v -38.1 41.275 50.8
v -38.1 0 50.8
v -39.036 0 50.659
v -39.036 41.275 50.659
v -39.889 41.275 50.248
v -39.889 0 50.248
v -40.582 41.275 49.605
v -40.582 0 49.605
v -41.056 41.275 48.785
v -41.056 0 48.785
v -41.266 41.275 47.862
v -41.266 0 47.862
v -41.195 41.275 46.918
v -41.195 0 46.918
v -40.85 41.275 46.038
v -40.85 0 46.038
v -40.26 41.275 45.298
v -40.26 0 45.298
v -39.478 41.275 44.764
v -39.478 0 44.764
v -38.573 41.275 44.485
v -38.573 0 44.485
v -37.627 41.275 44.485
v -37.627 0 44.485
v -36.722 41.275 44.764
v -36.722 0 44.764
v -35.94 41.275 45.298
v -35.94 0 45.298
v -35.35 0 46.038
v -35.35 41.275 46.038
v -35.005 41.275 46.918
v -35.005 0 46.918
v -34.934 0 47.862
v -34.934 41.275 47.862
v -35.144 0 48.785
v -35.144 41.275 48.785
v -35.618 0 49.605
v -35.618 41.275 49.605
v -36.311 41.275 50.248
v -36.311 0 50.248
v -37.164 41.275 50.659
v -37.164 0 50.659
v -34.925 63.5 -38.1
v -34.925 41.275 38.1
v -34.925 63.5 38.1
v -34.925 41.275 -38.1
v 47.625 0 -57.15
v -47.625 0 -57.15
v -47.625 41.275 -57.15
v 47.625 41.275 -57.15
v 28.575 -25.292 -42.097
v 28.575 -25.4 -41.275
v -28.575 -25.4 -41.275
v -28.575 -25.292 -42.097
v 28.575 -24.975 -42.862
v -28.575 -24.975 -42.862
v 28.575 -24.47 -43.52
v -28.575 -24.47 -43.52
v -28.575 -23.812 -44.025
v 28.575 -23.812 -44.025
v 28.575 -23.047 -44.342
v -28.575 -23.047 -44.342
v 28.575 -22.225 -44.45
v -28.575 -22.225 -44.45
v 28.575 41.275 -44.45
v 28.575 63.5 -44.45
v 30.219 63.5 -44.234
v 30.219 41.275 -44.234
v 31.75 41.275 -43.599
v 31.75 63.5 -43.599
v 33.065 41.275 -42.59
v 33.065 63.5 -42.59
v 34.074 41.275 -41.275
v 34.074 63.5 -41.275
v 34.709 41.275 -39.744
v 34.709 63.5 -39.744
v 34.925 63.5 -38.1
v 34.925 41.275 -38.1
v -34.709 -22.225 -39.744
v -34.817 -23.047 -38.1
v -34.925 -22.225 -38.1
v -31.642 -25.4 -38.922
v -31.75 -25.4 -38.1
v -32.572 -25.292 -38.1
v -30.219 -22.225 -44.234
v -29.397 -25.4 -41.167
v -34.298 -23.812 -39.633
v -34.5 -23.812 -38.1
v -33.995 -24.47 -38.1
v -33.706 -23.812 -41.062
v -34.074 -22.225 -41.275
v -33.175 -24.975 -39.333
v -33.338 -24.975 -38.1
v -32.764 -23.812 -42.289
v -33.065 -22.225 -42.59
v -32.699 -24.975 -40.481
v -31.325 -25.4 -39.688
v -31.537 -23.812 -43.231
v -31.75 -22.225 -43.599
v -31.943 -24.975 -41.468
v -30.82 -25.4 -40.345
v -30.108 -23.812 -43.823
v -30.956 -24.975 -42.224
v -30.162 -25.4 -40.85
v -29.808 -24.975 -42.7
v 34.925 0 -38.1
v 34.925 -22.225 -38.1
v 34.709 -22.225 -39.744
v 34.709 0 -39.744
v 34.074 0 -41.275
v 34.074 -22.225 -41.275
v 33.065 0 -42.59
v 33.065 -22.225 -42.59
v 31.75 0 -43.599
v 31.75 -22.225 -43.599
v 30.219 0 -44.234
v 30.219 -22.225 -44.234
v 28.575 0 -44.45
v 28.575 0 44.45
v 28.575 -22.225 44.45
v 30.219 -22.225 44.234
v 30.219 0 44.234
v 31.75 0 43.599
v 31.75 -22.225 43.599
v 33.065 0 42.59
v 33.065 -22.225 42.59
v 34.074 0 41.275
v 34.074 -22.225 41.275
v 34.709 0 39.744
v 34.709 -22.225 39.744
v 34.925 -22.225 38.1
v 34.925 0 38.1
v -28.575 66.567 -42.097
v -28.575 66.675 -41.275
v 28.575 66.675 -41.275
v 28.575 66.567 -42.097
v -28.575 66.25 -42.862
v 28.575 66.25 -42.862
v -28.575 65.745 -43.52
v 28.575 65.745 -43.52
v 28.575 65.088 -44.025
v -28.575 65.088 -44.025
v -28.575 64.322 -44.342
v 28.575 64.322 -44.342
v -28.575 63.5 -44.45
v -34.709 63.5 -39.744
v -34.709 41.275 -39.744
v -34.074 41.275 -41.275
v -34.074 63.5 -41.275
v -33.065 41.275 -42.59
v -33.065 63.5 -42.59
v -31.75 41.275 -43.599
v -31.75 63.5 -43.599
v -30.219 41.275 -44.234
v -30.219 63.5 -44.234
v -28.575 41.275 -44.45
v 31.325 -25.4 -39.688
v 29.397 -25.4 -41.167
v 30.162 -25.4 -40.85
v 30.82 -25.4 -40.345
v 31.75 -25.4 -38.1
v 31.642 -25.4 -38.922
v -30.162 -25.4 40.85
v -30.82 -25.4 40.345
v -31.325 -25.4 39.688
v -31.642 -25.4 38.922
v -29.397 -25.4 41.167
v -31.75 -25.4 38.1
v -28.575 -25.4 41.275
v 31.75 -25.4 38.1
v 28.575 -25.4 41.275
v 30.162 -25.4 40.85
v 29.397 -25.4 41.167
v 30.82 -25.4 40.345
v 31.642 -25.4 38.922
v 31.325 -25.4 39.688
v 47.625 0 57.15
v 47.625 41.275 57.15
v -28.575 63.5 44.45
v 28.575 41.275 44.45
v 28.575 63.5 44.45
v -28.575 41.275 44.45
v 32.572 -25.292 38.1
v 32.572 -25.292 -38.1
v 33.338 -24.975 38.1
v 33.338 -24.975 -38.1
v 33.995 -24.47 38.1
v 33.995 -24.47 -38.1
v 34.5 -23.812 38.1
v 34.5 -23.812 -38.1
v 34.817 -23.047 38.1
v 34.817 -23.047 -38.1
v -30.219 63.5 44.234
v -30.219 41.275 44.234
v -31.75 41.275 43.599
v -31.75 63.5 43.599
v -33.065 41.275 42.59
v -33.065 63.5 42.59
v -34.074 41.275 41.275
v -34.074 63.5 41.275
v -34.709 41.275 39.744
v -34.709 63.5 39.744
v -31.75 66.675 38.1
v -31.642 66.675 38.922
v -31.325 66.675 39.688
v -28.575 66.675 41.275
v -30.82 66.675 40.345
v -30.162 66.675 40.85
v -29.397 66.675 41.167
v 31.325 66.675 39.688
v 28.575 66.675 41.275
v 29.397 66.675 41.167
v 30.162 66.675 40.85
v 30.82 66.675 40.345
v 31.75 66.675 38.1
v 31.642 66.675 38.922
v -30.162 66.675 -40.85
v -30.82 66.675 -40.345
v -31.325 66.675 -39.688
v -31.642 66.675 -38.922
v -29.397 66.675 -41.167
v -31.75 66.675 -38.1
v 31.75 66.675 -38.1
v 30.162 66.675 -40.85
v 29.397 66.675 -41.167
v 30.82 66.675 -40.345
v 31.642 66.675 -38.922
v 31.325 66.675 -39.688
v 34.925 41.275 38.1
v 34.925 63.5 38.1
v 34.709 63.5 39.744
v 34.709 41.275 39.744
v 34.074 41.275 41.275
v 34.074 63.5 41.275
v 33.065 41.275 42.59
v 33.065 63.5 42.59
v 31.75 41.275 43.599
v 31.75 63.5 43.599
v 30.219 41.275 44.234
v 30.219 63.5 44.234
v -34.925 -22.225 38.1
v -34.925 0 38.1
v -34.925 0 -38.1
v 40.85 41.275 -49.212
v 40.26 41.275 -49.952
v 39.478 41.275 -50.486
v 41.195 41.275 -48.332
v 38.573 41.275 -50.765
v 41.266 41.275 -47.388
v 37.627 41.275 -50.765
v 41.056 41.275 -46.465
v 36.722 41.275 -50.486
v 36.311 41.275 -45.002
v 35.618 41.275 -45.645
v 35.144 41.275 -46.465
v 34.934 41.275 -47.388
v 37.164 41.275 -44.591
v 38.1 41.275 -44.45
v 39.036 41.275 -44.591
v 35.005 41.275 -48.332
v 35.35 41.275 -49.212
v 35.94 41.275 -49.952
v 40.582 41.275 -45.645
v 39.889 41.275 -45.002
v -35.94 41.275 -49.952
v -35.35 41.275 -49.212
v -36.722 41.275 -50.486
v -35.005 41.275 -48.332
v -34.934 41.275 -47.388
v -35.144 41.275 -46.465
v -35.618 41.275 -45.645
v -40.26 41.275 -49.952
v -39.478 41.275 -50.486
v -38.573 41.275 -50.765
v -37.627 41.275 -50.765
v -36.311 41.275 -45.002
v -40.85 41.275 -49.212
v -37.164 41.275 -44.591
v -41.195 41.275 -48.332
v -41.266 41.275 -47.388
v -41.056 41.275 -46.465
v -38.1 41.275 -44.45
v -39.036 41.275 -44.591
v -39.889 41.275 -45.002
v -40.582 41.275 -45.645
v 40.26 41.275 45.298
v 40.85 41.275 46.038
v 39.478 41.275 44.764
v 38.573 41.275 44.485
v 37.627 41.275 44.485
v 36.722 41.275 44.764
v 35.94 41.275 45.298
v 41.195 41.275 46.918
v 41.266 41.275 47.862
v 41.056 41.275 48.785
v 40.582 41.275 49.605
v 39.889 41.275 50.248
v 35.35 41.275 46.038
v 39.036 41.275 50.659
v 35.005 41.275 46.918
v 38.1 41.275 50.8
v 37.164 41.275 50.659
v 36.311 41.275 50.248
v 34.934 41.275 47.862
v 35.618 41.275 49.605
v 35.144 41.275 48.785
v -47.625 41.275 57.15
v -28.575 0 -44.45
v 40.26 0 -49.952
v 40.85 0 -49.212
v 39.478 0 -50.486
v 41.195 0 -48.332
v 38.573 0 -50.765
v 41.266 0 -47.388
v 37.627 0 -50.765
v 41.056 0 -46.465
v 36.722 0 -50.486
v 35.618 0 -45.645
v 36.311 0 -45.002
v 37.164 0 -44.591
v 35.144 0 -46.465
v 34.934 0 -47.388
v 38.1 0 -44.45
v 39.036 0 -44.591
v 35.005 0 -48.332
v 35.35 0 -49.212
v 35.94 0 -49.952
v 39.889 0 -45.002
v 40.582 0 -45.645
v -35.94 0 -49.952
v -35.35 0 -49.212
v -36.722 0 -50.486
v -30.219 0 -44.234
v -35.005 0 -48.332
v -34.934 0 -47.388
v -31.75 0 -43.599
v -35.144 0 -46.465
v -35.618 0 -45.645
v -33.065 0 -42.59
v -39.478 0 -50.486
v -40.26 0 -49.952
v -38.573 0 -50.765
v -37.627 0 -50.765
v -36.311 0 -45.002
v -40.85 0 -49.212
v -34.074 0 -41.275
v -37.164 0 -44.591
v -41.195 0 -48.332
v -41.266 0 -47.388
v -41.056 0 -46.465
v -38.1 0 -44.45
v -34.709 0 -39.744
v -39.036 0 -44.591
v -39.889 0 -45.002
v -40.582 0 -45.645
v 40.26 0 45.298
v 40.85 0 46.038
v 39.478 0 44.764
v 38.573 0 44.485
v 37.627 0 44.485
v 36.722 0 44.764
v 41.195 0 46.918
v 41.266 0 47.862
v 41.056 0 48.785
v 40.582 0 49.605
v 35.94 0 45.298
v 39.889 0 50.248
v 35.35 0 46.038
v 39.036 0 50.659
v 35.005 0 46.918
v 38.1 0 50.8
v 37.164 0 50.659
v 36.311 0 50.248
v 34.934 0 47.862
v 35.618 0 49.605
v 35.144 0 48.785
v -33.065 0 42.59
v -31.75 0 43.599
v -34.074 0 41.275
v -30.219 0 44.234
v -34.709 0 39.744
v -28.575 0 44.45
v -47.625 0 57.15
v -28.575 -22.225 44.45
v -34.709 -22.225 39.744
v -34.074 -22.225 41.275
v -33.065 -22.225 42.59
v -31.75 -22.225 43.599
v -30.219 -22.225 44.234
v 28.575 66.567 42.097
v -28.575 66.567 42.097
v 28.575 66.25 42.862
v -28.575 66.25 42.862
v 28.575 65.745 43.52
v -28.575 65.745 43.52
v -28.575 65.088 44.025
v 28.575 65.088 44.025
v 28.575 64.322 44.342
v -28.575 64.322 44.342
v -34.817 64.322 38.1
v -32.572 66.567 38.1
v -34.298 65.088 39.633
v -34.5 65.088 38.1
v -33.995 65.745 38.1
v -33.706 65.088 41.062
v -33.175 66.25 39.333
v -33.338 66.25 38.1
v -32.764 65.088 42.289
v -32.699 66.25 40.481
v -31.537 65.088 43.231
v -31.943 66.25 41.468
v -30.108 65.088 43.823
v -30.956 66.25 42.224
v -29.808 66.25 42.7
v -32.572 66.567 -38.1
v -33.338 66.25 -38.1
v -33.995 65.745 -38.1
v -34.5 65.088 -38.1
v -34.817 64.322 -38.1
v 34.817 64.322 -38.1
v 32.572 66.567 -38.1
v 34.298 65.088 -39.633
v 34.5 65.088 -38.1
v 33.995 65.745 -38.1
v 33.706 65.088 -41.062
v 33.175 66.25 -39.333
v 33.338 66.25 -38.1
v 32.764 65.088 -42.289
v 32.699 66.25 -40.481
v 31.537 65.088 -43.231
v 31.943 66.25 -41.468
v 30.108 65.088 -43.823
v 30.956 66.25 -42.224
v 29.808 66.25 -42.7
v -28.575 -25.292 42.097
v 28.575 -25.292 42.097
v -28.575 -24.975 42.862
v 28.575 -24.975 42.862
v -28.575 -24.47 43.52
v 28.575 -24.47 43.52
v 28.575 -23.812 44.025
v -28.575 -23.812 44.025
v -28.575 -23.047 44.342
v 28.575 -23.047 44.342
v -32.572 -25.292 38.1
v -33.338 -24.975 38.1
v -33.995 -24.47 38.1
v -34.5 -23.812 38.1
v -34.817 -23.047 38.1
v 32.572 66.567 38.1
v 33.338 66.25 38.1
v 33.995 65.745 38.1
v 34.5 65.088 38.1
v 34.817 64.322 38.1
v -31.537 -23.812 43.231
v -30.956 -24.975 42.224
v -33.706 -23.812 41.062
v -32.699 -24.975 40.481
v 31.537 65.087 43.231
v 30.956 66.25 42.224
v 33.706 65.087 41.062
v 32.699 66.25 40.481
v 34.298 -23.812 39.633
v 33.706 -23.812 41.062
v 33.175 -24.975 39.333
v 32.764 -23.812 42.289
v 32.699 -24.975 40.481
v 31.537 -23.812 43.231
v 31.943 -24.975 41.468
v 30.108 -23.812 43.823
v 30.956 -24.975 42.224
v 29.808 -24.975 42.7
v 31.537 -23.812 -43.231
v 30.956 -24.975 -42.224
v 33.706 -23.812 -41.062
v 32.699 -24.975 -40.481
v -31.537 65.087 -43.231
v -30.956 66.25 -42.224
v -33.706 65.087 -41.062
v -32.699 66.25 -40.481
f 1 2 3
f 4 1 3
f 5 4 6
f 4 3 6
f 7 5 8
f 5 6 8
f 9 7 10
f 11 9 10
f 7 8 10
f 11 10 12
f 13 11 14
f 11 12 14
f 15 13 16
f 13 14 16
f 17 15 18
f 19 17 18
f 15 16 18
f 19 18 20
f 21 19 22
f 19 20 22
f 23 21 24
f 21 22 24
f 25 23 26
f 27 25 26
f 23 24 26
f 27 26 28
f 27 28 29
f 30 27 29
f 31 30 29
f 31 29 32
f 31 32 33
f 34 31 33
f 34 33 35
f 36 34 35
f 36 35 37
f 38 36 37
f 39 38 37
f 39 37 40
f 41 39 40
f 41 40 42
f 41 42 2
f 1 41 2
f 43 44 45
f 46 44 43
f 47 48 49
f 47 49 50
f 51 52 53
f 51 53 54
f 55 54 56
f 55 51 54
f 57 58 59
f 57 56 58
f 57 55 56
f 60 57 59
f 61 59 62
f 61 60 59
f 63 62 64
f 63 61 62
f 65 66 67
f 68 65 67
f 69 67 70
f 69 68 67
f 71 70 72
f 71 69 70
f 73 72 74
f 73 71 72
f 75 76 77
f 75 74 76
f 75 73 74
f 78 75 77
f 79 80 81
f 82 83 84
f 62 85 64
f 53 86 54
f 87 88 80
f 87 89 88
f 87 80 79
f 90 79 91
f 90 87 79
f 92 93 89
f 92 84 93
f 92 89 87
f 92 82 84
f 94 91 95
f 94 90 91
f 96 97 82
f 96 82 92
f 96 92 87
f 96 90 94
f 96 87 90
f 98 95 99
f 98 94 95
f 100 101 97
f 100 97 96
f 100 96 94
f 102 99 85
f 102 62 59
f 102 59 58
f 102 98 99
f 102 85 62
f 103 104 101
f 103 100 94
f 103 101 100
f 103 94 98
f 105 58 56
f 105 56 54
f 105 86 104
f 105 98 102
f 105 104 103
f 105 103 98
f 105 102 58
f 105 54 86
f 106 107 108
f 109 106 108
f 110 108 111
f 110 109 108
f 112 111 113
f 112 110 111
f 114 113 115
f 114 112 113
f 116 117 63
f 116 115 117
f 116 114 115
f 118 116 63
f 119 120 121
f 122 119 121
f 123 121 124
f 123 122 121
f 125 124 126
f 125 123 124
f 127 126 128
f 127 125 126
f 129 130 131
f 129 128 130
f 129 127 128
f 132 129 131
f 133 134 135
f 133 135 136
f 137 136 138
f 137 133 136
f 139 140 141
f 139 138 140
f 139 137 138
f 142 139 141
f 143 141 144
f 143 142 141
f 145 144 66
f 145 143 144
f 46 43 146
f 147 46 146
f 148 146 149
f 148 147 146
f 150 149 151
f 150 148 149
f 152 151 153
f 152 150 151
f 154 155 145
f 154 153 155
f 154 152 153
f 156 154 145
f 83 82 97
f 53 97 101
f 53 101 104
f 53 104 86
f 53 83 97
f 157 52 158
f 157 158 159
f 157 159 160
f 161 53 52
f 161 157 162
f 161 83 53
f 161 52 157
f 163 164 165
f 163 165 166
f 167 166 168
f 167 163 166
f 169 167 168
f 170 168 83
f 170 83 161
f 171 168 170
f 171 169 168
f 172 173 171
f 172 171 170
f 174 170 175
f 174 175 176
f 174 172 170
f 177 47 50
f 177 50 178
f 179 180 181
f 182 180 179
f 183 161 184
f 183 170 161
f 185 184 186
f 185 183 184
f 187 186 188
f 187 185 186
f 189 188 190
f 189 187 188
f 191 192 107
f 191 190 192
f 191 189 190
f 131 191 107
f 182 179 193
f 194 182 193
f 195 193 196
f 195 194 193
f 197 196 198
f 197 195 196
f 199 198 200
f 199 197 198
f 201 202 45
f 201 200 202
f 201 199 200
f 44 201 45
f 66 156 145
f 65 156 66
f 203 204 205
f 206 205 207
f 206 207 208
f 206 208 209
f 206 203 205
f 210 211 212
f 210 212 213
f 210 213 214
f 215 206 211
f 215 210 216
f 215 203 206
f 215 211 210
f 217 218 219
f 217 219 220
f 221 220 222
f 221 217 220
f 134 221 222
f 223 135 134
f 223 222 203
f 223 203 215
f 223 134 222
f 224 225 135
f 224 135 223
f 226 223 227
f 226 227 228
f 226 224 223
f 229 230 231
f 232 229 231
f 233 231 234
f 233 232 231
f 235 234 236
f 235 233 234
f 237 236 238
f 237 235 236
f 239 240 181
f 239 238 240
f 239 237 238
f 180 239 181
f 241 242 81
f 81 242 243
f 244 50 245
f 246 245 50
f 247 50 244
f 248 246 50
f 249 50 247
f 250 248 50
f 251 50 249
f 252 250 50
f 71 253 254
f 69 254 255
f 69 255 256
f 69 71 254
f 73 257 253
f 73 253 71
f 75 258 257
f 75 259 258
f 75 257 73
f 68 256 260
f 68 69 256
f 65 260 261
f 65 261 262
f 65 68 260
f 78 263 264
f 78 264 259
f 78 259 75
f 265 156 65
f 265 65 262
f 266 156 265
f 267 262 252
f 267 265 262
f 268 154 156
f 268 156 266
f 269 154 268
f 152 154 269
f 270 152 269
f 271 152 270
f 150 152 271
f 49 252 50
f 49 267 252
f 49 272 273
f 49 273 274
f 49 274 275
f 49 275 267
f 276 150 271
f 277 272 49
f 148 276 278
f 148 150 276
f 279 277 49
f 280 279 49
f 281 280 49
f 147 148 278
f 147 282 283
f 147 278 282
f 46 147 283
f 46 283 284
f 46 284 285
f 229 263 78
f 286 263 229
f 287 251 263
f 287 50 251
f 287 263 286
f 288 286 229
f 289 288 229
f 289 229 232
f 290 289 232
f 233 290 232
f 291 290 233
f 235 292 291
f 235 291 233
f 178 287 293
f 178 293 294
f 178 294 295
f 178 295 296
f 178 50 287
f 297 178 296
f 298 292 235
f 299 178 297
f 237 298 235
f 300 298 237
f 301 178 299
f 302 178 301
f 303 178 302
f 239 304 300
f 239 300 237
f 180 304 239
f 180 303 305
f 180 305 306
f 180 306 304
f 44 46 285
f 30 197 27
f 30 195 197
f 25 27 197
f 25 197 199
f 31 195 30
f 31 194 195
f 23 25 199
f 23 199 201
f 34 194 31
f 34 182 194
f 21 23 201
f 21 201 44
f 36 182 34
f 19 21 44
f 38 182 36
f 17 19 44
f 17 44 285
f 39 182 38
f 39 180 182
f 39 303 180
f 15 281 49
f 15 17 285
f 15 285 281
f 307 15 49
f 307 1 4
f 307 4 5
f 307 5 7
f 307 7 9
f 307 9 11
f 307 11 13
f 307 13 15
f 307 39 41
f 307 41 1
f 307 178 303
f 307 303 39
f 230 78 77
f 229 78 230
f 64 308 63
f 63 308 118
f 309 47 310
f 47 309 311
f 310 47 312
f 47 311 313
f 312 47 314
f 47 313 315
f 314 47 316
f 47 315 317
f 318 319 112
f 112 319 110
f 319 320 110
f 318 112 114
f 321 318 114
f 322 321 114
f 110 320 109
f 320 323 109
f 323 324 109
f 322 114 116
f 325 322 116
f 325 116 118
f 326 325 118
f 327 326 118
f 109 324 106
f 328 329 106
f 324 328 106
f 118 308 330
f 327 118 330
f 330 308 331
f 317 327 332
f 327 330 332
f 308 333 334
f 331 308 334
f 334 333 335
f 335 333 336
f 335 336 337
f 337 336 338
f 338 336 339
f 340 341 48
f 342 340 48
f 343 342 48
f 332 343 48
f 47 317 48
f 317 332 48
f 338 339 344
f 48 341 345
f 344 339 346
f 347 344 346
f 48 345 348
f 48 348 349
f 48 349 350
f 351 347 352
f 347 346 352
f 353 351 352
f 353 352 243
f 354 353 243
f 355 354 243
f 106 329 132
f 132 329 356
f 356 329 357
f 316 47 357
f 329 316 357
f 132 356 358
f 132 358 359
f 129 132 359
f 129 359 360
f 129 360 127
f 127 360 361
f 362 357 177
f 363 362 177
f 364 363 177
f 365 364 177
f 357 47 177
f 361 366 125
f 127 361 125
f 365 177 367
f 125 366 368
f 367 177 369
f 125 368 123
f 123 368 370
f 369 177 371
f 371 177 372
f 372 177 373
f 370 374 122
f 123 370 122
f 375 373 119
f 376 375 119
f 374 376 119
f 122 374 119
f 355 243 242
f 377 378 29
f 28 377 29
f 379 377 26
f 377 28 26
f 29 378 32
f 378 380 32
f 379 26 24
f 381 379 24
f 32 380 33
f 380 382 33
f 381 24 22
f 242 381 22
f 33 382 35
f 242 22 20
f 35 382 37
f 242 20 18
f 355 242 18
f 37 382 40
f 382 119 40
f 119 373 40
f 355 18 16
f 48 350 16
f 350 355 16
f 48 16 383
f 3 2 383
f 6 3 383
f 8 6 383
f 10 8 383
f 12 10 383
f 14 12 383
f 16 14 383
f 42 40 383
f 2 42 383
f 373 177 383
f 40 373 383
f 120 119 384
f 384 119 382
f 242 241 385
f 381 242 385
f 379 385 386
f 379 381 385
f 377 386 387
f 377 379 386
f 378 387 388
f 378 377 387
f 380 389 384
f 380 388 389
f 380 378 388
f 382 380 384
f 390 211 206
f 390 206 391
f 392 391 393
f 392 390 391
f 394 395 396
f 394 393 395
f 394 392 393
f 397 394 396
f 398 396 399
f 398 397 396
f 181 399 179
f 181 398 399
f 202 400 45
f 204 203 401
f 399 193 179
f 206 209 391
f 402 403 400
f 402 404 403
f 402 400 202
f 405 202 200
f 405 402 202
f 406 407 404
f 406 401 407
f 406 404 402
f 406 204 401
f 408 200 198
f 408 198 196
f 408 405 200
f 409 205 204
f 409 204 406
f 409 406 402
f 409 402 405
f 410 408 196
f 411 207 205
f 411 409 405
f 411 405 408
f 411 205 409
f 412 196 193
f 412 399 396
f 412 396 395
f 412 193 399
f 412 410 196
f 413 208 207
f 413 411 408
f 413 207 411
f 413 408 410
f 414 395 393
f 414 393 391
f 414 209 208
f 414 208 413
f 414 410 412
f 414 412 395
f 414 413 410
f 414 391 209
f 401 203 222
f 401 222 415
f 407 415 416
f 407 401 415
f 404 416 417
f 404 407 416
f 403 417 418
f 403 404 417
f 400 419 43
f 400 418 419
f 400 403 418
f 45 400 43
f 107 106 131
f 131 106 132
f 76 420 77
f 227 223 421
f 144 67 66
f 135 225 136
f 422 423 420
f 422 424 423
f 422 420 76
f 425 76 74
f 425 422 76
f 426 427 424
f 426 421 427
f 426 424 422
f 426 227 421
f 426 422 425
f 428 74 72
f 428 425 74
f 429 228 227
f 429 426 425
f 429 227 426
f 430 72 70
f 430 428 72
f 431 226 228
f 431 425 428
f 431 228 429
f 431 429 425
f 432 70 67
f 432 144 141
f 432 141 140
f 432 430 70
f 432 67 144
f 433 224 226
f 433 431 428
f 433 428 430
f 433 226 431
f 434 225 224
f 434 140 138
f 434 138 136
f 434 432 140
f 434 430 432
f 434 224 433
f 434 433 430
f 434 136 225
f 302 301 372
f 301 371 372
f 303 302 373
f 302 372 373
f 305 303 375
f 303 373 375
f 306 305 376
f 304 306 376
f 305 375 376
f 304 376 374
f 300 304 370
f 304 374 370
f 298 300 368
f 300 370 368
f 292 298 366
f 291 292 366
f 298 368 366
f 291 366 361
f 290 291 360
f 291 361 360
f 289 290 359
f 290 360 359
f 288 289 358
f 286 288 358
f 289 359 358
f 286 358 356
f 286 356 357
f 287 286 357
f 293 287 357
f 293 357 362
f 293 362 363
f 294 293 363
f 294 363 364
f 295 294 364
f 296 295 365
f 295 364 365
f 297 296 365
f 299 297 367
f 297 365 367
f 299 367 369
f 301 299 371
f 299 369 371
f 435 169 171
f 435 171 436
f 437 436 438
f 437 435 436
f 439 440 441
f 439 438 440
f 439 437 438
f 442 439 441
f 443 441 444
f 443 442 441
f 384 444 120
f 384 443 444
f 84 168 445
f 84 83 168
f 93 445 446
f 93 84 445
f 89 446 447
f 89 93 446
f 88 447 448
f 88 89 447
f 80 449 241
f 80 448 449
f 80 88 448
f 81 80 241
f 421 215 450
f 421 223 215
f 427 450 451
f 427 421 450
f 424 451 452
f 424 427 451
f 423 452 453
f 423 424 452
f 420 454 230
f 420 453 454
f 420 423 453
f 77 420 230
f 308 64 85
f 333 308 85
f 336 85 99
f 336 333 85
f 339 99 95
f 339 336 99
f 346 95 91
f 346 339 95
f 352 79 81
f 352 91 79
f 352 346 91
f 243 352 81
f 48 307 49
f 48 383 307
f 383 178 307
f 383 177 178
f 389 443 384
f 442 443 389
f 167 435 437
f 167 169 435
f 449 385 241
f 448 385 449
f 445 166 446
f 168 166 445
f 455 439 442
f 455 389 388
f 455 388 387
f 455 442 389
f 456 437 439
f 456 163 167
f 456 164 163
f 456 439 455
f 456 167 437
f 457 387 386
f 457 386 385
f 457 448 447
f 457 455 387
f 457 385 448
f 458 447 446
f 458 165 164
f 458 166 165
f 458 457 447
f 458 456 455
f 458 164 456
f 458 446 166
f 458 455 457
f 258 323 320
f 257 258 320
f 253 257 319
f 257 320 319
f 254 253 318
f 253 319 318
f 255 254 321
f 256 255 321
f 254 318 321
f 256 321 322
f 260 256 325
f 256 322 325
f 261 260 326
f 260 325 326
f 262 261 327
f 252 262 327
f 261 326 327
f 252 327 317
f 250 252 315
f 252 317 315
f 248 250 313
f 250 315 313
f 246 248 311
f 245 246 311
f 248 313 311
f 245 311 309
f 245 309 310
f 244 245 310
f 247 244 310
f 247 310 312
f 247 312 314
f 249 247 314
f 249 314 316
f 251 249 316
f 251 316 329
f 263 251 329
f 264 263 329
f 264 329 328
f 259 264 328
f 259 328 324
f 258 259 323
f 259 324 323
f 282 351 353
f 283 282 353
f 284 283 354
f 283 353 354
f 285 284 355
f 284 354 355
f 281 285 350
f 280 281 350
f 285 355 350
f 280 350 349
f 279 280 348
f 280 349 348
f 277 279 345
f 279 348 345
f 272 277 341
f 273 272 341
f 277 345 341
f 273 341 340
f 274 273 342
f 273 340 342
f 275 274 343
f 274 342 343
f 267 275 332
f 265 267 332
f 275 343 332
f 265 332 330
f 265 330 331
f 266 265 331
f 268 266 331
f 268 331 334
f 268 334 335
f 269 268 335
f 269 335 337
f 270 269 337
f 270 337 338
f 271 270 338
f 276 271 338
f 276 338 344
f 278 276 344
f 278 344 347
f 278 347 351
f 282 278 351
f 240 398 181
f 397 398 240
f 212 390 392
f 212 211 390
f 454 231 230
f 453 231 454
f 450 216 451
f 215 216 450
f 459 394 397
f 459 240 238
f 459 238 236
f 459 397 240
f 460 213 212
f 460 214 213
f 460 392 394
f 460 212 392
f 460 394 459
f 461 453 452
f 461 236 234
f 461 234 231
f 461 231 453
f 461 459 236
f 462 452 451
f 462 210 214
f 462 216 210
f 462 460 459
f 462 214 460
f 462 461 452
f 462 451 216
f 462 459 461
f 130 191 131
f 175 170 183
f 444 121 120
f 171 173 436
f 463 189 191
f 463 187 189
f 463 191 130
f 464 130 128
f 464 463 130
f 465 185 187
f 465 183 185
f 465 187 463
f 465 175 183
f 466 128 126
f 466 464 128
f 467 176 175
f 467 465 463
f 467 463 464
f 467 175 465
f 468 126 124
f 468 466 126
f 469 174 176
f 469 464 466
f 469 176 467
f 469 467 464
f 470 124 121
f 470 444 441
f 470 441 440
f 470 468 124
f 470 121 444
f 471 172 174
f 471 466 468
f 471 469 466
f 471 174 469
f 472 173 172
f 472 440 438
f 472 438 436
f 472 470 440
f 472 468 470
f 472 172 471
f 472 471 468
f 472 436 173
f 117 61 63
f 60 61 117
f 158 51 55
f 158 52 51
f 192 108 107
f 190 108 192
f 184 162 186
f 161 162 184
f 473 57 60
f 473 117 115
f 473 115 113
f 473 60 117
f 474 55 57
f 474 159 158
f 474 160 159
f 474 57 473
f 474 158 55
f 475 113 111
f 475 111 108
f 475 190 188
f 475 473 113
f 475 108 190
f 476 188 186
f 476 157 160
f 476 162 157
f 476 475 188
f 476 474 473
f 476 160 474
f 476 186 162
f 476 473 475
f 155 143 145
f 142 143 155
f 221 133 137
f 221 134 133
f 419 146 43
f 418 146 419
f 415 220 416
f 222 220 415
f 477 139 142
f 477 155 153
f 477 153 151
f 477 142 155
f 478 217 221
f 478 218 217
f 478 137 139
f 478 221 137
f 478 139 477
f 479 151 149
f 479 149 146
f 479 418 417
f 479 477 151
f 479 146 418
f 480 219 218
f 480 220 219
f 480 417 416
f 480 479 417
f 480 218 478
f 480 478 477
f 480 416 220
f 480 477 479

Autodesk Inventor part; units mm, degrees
ref_plane "YZ Plane" through (0, 0, 0) normal (1, 0, 0) x (0, 1, 0)
ref_plane "XZ Plane" through (0, 0, 0) normal (0, 1, 0) x (-1, 0, 0)
ref_plane "XY Plane" through (0, 0, 0) normal (0, 0, 1) x (1, 0, 0)
sketch "Sketch1" plane through (0, 0, 0) normal (0, 1, 0) x (-1, 0, 0)
  line L0 (-47.625, 57.15) -> (47.625, 57.15)
  line L1 (47.625, 57.15) -> (47.625, -57.15)
  line L2 (47.625, -57.15) -> (-47.625, -57.15)
  line L3 (-47.625, -57.15) -> (-47.625, 57.15)
  line L4 (-47.625, 57.15) -> (47.625, -57.15) construction
  line L5 (47.625, 57.15) -> (-47.625, -57.15) construction
  point P0 (0, 0)
  dimension "d0" = 114.3
  dimension "d1" = 95.25
extrude "Extrusion1" add sketch "Sketch1" along normal blind 41.275
sketch "Sketch2" plane through (0, 41.275, 0) normal (0, 1, 0) x (1, 0, 0)
  line L0 (28.575, -44.45) -> (-28.575, -44.45)
  line L1 (-34.925, -38.1) -> (-34.925, 38.1)
  line L2 (-28.575, 44.45) -> (28.575, 44.45)
  line L3 (34.925, 38.1) -> (34.925, -38.1)
  line L4 (34.925, -44.45) -> (-34.925, 44.45) construction
  line L5 (-34.925, -44.45) -> (34.925, 44.45) construction
  arc A0 (-34.925, -38.1) -> (-28.575, -44.45) centre (-28.575, -38.1) ccw
  arc A1 (-28.575, 44.45) -> (-34.925, 38.1) centre (-28.575, 38.1) ccw
  arc A2 (34.925, 38.1) -> (28.575, 44.45) centre (28.575, 38.1) ccw
  arc A3 (28.575, -44.45) -> (34.925, -38.1) centre (28.575, -38.1) ccw
  line L6 (-47.625, 57.15) -> (-47.625, -57.15) projected
  line L7 (47.625, 57.15) -> (-47.625, 57.15) projected
  point P0 (0, 0)
  dimension "d6" = 6.35
  dimension "d25" = 12.7
  dimension "d26" = 12.7
extrude "Extrusion2" add sketch "Sketch2" along normal blind 25.4
fillet "Fillet1" radius 3.175 8 edges at (33.0651, 66.675, 42.5901) (34.925, 66.675, 0) (33.0651, 66.675, -42.5901) (0, 66.675, -44.45) (-33.0651, 66.675, -42.5901) (-34.925, 66.675, 0) (-33.0651, 66.675, 42.5901) (0, 66.675, 44.45)
hole "Hole1" at (38.1, 41.275, 47.625) direction (0, -1, 0) diameter 6.35 end through all
pattern_linear "Rectangular Pattern1" count 2 spacing 95.25 along (0, 0, -1) count 2 spacing 76.2 along (-1, 0, 0) of "Hole1"
sketch "Sketch3" plane through (0, 0, 0) normal (0, -1, 0) x (1, 0, 0)
  line L0 (-28.575, -44.45) -> (28.575, -44.45)
  line L1 (34.925, -38.1) -> (34.925, 38.1)
  line L2 (28.575, 44.45) -> (-28.575, 44.45)
  line L3 (-34.925, 38.1) -> (-34.925, -38.1)
  line L4 (-34.925, -44.45) -> (34.925, 44.45) construction
  line L5 (34.925, -44.45) -> (-34.925, 44.45) construction
  line L6 (47.625, 57.15) -> (-47.625, 57.15) projected
  line L7 (47.625, -57.15) -> (47.625, 57.15) projected
  arc A0 (-28.575, 44.45) -> (-34.925, 38.1) centre (-28.575, 38.1) ccw
  arc A1 (34.925, 38.1) -> (28.575, 44.45) centre (28.575, 38.1) ccw
  arc A2 (28.575, -44.45) -> (34.925, -38.1) centre (28.575, -38.1) ccw
  arc A3 (-34.925, -38.1) -> (-28.575, -44.45) centre (-28.575, -38.1) ccw
  point P0 (0, 0)
  dimension "d27" = 12.7
  dimension "d28" = 12.7
  dimension "d29" = 6.35
extrude "Extrusion3" add sketch "Sketch3" along normal blind 25.4
fillet "Fillet2" radius 3.175 8 edges at (-33.0651, -25.4, 42.5901) (-34.925, -25.4, 0) (-33.0651, -25.4, -42.5901) (0, -25.4, -44.45) (33.0651, -25.4, -42.5901) (34.925, -25.4, 0) (33.0651, -25.4, 42.5901) (0, -25.4, 44.45)
properties part number "xmfr power" material "Iron, Malleable"
